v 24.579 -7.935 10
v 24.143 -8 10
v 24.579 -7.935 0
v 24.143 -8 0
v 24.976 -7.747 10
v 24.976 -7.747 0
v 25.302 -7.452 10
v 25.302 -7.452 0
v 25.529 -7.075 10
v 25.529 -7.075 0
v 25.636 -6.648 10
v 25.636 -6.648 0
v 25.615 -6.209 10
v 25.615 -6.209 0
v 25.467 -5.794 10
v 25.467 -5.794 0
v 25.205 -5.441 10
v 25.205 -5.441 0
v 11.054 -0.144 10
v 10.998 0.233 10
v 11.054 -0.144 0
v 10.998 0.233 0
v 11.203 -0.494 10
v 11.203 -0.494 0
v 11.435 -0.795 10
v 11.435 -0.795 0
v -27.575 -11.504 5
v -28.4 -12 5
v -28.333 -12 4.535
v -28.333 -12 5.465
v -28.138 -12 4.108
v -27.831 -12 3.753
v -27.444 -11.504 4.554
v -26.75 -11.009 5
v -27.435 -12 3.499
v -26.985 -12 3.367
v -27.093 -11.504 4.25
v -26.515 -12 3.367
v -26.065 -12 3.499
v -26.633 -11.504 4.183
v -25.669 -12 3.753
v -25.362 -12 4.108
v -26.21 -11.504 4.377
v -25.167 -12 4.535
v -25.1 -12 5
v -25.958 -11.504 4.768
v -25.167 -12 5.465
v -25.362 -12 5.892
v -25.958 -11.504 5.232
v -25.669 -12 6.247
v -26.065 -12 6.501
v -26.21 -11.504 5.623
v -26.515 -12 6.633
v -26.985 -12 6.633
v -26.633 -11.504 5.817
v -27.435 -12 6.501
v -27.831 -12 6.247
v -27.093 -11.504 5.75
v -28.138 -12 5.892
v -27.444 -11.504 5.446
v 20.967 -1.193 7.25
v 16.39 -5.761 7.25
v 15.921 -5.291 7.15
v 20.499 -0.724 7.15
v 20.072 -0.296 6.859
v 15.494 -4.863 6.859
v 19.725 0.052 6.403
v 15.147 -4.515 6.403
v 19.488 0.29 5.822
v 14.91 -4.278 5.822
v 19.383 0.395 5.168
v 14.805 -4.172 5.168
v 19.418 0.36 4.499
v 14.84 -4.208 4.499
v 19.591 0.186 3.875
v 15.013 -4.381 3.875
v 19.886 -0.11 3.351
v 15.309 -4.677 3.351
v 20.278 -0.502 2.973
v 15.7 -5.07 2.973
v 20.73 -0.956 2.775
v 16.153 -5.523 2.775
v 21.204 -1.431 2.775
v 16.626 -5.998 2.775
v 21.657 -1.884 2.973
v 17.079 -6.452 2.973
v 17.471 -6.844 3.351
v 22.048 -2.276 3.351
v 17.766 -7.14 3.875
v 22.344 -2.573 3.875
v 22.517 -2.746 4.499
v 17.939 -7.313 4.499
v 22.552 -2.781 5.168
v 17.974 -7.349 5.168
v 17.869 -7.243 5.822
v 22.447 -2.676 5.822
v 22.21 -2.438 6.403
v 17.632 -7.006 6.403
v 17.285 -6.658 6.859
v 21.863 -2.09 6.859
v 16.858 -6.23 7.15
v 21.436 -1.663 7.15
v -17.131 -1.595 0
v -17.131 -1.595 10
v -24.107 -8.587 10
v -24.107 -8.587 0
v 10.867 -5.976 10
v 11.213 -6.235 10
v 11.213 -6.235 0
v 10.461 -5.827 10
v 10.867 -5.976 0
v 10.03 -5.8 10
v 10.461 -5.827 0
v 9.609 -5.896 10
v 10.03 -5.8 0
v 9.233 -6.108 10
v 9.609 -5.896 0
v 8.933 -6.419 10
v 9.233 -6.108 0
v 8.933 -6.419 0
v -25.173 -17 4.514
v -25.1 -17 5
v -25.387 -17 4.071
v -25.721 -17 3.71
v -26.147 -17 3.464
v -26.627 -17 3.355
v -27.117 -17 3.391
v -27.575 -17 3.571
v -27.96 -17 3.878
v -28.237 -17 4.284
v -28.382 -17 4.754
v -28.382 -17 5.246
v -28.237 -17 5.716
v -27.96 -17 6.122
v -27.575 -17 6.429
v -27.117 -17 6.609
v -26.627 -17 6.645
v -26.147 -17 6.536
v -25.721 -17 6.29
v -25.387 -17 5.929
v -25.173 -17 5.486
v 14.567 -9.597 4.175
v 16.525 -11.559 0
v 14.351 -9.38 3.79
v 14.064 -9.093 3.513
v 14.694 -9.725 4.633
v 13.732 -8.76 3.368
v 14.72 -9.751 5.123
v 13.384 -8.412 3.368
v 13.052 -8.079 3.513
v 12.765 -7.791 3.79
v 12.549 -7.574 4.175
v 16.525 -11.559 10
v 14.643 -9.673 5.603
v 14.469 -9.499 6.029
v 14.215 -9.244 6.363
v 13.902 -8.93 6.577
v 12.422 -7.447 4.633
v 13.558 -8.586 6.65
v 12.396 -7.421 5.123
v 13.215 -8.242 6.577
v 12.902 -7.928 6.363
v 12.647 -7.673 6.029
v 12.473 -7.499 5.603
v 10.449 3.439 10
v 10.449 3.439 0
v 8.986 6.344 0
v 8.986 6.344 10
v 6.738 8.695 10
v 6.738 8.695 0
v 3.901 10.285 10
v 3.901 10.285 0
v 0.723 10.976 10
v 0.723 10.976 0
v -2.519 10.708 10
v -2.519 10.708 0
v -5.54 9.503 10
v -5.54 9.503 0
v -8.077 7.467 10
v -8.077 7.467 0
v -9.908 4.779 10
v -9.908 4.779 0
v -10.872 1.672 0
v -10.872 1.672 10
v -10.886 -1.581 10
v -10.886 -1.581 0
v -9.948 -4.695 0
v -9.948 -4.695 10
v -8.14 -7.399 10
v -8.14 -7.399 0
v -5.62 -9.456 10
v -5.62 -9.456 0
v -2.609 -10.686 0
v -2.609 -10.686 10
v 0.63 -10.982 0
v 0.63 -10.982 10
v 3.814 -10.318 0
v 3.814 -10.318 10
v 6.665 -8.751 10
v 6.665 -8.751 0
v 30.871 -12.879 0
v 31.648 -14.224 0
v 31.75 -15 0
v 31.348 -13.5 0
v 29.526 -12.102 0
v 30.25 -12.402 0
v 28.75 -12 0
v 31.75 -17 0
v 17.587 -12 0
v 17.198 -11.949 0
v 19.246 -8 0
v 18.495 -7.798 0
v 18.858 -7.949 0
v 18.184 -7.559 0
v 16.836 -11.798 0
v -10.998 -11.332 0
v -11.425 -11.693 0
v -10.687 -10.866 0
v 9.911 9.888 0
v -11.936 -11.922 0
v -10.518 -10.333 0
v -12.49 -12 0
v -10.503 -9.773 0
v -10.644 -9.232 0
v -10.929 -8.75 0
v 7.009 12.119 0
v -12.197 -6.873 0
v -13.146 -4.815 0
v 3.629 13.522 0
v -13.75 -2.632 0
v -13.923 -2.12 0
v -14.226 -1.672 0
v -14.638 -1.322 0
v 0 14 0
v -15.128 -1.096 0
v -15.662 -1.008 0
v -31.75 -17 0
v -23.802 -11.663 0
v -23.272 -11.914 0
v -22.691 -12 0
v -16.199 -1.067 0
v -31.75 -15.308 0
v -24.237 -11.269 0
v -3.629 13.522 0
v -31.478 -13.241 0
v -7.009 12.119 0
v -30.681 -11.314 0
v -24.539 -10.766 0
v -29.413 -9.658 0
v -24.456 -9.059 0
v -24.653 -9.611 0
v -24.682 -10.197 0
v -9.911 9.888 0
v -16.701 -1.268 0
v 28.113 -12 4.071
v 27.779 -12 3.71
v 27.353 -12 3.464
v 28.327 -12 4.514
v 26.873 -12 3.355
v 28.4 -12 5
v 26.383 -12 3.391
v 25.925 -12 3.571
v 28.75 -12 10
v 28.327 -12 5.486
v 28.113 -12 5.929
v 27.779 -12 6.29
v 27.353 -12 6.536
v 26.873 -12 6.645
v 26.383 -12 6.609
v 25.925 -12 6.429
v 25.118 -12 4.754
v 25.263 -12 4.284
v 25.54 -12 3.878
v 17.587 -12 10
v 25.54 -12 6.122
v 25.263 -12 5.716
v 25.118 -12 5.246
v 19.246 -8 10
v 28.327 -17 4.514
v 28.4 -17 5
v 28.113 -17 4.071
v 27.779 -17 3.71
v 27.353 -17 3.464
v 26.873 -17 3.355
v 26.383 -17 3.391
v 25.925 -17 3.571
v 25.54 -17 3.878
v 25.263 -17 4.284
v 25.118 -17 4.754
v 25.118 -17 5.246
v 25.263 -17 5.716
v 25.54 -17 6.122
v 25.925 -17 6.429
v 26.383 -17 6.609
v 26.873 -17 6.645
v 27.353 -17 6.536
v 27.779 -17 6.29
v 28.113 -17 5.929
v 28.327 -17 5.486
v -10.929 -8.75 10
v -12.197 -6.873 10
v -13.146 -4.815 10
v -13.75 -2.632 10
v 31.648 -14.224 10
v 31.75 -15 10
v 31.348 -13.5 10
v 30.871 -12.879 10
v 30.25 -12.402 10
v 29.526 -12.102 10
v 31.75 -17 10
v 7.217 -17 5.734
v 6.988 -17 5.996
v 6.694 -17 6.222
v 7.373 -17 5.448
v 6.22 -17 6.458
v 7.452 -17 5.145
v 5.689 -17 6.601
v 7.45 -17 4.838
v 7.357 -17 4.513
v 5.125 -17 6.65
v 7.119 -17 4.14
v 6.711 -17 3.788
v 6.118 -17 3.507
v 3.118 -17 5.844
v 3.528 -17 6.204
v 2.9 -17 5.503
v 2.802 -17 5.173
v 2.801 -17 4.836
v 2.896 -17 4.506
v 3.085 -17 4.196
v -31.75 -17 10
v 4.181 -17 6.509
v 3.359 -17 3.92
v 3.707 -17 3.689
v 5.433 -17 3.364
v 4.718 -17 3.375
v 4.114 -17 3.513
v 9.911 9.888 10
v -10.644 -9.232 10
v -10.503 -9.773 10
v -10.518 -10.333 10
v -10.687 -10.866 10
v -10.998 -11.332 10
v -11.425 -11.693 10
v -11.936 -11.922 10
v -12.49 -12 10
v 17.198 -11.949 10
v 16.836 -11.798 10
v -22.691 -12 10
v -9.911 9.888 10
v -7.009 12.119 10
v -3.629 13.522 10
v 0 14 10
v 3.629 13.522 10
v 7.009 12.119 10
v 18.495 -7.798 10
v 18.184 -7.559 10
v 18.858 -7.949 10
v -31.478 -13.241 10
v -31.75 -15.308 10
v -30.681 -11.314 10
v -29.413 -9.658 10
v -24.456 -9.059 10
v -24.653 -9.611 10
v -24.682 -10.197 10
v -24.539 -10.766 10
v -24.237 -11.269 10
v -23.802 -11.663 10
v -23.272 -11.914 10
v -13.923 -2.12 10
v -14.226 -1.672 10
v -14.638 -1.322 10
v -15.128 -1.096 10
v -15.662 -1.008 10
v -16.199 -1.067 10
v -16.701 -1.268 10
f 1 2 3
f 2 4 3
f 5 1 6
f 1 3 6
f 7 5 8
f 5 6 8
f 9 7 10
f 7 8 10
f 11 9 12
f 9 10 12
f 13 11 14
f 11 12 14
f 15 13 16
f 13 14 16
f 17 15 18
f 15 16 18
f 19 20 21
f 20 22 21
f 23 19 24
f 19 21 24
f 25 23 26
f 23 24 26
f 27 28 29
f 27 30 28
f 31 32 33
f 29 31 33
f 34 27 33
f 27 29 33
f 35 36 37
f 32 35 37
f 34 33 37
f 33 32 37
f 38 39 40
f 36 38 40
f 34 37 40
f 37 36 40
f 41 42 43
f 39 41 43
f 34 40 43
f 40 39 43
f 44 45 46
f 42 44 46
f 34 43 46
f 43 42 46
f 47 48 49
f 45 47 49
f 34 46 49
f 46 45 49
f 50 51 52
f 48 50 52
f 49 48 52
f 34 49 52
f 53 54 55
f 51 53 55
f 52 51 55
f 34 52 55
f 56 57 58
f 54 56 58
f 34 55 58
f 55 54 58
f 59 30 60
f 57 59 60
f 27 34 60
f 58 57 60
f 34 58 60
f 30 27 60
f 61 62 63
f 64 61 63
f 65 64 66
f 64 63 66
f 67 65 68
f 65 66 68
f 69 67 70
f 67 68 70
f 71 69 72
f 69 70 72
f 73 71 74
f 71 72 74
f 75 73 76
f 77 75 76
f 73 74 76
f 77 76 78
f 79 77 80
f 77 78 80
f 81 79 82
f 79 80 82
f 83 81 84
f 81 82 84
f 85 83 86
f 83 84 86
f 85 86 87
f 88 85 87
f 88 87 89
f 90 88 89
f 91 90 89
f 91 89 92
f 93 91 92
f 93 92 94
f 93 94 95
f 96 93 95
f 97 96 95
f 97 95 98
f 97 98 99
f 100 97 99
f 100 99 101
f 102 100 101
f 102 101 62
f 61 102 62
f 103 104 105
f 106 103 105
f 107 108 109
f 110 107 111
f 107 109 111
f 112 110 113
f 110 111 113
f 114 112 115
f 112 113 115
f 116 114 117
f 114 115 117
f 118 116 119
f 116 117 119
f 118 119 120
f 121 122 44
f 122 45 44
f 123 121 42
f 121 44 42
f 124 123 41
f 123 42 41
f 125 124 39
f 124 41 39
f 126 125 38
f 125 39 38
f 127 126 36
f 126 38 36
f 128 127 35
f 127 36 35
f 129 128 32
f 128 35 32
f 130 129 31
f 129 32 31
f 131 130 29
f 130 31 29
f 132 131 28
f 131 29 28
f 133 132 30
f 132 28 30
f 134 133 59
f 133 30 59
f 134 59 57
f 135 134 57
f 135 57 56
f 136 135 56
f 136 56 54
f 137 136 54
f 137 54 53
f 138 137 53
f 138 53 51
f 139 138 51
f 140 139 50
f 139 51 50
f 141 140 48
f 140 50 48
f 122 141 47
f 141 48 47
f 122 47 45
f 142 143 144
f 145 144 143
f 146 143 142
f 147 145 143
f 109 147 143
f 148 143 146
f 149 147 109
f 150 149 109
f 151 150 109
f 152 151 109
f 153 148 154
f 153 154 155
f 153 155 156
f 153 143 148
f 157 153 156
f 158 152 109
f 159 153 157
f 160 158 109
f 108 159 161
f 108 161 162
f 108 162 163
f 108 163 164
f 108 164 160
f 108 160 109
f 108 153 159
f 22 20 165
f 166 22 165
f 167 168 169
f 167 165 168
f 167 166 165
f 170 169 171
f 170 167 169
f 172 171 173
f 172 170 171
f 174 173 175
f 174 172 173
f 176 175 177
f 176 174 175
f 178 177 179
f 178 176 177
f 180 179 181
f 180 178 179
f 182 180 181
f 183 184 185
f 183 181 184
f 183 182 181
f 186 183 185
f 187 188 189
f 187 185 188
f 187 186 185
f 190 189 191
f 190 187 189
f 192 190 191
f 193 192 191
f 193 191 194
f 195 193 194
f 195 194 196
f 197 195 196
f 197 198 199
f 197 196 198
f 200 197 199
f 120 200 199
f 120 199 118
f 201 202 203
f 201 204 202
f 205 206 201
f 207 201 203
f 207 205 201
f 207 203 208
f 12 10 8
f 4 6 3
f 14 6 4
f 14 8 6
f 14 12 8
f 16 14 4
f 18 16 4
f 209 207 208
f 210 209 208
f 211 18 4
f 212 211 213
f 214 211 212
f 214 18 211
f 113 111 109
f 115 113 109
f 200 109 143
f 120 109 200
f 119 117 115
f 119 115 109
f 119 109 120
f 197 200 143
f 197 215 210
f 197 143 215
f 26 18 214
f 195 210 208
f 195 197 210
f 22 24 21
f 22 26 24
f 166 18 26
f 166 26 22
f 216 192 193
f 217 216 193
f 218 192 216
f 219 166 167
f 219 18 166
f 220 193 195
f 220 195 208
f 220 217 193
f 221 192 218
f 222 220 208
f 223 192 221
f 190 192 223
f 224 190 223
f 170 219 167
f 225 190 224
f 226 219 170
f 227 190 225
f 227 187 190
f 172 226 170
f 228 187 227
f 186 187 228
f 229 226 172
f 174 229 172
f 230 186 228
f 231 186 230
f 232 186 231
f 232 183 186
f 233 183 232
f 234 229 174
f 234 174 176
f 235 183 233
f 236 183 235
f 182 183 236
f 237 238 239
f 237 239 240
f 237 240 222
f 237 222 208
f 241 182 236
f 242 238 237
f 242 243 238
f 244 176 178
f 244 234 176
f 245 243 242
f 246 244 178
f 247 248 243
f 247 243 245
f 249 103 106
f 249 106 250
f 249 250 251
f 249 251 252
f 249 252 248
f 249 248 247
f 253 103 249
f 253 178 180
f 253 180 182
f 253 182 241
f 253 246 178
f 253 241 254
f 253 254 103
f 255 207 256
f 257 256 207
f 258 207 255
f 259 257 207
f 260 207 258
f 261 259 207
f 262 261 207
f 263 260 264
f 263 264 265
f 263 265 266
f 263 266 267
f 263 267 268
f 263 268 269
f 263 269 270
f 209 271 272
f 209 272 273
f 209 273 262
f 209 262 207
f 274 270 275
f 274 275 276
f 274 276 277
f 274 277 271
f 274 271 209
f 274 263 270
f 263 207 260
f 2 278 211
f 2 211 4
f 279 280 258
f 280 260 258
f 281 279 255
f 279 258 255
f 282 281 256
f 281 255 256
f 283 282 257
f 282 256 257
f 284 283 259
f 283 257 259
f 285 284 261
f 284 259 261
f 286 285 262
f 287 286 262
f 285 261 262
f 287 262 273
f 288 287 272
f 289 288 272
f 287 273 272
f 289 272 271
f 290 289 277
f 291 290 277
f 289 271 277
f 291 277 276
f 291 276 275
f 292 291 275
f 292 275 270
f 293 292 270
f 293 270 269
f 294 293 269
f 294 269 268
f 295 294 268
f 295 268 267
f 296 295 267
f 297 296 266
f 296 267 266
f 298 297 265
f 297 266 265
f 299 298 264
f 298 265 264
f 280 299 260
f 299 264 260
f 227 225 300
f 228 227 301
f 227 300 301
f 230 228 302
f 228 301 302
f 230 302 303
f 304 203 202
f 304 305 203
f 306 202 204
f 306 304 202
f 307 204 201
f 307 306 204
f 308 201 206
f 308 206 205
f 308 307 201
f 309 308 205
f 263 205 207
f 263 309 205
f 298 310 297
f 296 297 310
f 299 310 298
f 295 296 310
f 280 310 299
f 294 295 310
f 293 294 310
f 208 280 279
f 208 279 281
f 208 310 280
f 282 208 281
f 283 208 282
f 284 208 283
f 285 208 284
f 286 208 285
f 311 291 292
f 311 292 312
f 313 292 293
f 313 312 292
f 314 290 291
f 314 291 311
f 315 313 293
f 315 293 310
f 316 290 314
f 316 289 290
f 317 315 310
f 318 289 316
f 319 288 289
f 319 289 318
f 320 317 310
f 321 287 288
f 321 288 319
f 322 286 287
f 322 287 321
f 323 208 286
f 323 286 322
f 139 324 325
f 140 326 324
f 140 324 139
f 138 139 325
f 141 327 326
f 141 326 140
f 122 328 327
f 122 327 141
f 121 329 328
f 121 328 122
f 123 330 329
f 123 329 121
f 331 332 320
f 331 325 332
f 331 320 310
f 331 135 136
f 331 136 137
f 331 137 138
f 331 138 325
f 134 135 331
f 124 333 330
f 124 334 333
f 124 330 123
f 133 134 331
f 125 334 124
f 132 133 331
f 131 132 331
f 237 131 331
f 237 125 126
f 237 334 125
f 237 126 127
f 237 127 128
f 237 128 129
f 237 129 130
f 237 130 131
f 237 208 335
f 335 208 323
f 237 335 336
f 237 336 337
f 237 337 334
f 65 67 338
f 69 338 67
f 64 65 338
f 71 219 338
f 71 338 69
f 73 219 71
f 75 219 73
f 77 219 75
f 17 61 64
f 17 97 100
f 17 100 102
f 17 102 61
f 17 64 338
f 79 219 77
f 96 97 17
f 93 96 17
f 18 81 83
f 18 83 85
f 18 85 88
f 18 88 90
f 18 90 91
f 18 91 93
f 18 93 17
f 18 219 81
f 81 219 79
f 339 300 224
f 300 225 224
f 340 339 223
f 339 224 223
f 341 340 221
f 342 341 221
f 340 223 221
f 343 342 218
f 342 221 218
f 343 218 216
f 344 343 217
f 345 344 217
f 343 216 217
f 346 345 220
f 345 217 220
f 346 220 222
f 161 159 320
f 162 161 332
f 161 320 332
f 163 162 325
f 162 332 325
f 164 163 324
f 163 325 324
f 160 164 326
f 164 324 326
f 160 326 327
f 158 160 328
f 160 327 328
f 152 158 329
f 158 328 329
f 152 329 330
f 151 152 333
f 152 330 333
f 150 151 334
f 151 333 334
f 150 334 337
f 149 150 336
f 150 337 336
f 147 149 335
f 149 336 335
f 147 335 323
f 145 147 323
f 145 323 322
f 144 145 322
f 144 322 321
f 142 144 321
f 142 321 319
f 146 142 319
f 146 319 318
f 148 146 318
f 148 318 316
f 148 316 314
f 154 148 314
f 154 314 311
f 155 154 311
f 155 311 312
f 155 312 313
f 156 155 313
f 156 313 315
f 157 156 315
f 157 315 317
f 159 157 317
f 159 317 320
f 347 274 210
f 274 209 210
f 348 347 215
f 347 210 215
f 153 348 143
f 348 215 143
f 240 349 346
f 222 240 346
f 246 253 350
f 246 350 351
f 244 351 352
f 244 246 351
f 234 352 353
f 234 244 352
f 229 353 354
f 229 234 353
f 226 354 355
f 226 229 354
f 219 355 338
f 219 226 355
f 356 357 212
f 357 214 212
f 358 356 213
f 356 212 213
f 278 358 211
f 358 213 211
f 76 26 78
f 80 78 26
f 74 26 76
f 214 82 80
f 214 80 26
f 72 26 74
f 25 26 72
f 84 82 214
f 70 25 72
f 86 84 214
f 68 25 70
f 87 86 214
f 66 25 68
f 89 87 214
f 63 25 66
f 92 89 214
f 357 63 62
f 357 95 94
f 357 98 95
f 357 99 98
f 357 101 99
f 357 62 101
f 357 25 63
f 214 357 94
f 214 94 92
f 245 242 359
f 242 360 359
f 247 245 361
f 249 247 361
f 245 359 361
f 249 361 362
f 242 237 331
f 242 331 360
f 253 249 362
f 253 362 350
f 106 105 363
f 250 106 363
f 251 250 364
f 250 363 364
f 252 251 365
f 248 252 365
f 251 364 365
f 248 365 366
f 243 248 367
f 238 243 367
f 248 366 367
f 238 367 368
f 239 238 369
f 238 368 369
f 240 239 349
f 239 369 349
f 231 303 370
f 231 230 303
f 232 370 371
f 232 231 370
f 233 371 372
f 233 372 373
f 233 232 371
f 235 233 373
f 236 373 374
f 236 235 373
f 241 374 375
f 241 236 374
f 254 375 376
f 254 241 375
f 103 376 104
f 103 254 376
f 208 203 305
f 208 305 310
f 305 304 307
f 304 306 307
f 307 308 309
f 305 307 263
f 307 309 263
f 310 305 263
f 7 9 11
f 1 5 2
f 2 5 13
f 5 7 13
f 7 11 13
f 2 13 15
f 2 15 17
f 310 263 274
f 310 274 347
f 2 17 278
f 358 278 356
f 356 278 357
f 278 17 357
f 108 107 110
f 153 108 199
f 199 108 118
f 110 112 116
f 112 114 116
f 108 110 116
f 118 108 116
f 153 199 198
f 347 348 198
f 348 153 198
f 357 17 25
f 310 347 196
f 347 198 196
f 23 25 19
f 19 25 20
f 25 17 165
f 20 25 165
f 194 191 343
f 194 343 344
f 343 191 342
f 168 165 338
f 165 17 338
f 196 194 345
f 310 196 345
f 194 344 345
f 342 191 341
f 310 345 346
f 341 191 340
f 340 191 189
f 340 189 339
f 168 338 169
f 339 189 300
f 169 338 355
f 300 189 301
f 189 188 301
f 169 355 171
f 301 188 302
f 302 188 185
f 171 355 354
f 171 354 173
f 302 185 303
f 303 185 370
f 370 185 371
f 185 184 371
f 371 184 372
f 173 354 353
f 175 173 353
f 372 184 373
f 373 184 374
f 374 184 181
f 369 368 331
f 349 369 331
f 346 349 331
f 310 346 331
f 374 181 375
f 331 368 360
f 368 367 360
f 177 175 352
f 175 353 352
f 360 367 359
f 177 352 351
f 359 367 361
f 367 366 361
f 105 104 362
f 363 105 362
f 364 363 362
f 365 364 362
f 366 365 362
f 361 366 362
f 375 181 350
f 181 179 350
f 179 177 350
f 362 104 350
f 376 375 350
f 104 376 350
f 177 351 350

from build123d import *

# Parameters (mm, degrees)
SKETCH_1_R            = 11
EXTRUDE_1_DEPTH       = 10
CUT_EXTRUDE_1_DEPTH   = 11
FILLET_1_R            = 1.5
M4X0_71_D             = 3.3
M4X0_71_DEPTH         = 5
M4X0_71_TIP           = 0.991420021
HOLE_WIZARD_M41_D     = 4.5
HOLE_WIZARD_M41_DEPTH = 6.466619964
M4X0_72_D             = 3.3
FILLET_2_R            = 3
CUT_EXTRUDE_2_DEPTH   = 11
FILLET_3_R            = 2
FILLET_5_R            = 8


with BuildPart() as part:
    # Эскиз1 → Бобышка-Вытянуть1 (new body)
    with BuildSketch(Plane.XY):
        with BuildLine():
            Line((-31.75, -12), (-9.910576673, 9.888400781))
            ThreePointArc((-9.910576673, 9.888400781), (0, 14), (9.910576673, 9.888400781))
            Line((9.910576673, 9.888400781), (31.75, -12))
            Line((31.75, -12), (31.75, -17))
            Line((31.75, -17), (-31.75, -17))
            Line((-31.75, -17), (-31.75, -12))
        make_face()
        Circle(SKETCH_1_R, mode=Mode.SUBTRACT)
    extrude(amount=EXTRUDE_1_DEPTH)

    # Эскиз2 → Вырез-Вытянуть1 (cut, through all)
    with BuildSketch(Plane.XY.offset(10)):
        Polygon((10.994327356, -0.353222306), (18.623994631, -8), (31.75, -8), (31.75, -12), (16.964515327, -12), (9.858995646, -4.878545362), align=None)
    extrude(amount=-CUT_EXTRUDE_1_DEPTH, mode=Mode.SUBTRACT)

    # Скругление1
    fillet_1_edges = [part.edges().sort_by_distance(p)[0] for p in [
        (27.758950394, -8, 5),
        (18.623994631, -8, 5),
        (9.858995646, -4.878545362, 5),
        (10.994327356, -0.353222306, 5),
        (16.964515327, -12, 5),
    ]]
    fillet(fillet_1_edges, radius=FILLET_1_R)

    # Отверстие обработанное метчиком M4x0.71
    with Locations(Plane(origin=(0, -17, 0), x_dir=(-1, 0, 0), z_dir=(0, -1, 0))):
        with Locations((26.75, -5), (-26.75, -5)):
            Hole(M4X0_71_D / 2, depth=M4X0_71_DEPTH)
            with Locations((0, 0, -(M4X0_71_DEPTH + M4X0_71_TIP / 2))):  # 118° drill point
                Cone(0, M4X0_71_D / 2, M4X0_71_TIP, mode=Mode.SUBTRACT)

    # Отверстие с зазором M41
    with Locations(Plane(origin=(9.910576673, 9.888400781, 0), x_dir=(0, 0, -1), z_dir=(0.707898334, 0.706314342, 0))):
        with Locations((-5, -15.654139496)):
            Hole(HOLE_WIZARD_M41_D / 2, depth=HOLE_WIZARD_M41_DEPTH)

    # Отверстие обработанное метчиком M4x0.72 (through all)
    with Locations(Plane(origin=(2.50127384, 2.495676993, 0), x_dir=(0, 0, -1), z_dir=(0.707898334, 0.706314342, 0))):
        with Locations((-5, -15.654139496)):
            Hole(M4X0_72_D / 2)

    # Скругление2
    fillet_2_edges = [part.edges().sort_by_distance(p)[0] for p in [
        (31.75, -12, 5),
    ]]
    fillet(fillet_2_edges, radius=FILLET_2_R)

    # Эскиз11 → Вырез-Вытянуть2 (cut, through all)
    with BuildSketch(Plane.XY.offset(10)):
        with BuildLine():
            Line((-13.9037433, 1.638878353), (-24.107110728, -8.587371317))
            ThreePointArc((-24.107110728, -8.587371317), (-24.53864421, -10.766401538), (-22.69131406, -12))
            Line((-22.69131406, -12), (-7.211102551, -12))
            ThreePointArc((-7.211102551, -12), (-12.568370201, -6.167339012), (-13.9037433, 1.638878353))
        make_face()
    extrude(amount=-CUT_EXTRUDE_2_DEPTH, mode=Mode.SUBTRACT)

    # Скругление3
    fillet_3_edges = [part.edges().sort_by_distance(p)[0] for p in [
        (-13.9037433, 1.638878353, 5),
        (-7.211102551, -12, 5),
    ]]
    fillet(fillet_3_edges, radius=FILLET_3_R)

    # Скругление5
    fillet_5_edges = [part.edges().sort_by_distance(p)[0] for p in [
        (-31.75, -12, 5),
    ]]
    fillet(fillet_5_edges, radius=FILLET_5_R)


solid = part.part
